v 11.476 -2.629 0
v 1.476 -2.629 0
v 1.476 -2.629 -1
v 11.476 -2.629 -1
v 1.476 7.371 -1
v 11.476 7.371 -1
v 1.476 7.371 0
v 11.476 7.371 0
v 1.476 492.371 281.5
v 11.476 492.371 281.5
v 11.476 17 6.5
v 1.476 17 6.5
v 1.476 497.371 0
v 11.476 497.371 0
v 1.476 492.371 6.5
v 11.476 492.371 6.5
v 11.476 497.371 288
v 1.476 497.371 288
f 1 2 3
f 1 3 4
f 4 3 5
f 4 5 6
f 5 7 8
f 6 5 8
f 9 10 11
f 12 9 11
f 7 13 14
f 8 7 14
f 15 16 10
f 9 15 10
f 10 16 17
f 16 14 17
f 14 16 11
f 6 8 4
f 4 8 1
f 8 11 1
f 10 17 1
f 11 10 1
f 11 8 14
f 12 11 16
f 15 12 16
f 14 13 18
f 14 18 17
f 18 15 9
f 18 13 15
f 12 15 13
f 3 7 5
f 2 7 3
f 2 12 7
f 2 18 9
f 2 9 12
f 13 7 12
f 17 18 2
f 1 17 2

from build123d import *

# Parameters (mm, degrees)
F0_W     = 10
F0_H     = 500
F1_DEPTH = 288
F3_DEPTH = 10
F5_DEPTH = 10
F6_W     = 10
F6_H     = 10
F7_DEPTH = 1


with BuildPart() as f1:
    # F0 (on Top) → F1 (new body)
    with BuildSketch(Plane.XY):
        with Locations((6.476007, 247.370639)):
            Rectangle(F0_W, F0_H)
    extrude(amount=F1_DEPTH)

    # F2 (on face) → F3 (cut)
    with BuildSketch(Plane(origin=(1.476007, 0, 0), x_dir=(0, -1, 0), z_dir=(-1, 0, 0))):
        Polygon((2.629361, 288), (-497.370639, 288), (2.629361, 0), align=None)
    extrude(amount=-F3_DEPTH, mode=Mode.SUBTRACT)

    # F4 (on face) → F5 (cut)
    with BuildSketch(Plane.YZ.offset(11.476007)):
        Polygon((492.370639, 281.5), (17, 6.5), (492.370639, 6.5), align=None)
    extrude(amount=-F5_DEPTH, mode=Mode.SUBTRACT)

    # F6 (on face) → F7 (join)
    with BuildSketch(Plane(origin=(0, 0, 0), x_dir=(1, 0, 0), z_dir=(0, 0, -1))):
        with Locations((6.476007, -2.370639)):
            Rectangle(F6_W, F6_H)
    extrude(amount=F7_DEPTH)


solid = f1.part
